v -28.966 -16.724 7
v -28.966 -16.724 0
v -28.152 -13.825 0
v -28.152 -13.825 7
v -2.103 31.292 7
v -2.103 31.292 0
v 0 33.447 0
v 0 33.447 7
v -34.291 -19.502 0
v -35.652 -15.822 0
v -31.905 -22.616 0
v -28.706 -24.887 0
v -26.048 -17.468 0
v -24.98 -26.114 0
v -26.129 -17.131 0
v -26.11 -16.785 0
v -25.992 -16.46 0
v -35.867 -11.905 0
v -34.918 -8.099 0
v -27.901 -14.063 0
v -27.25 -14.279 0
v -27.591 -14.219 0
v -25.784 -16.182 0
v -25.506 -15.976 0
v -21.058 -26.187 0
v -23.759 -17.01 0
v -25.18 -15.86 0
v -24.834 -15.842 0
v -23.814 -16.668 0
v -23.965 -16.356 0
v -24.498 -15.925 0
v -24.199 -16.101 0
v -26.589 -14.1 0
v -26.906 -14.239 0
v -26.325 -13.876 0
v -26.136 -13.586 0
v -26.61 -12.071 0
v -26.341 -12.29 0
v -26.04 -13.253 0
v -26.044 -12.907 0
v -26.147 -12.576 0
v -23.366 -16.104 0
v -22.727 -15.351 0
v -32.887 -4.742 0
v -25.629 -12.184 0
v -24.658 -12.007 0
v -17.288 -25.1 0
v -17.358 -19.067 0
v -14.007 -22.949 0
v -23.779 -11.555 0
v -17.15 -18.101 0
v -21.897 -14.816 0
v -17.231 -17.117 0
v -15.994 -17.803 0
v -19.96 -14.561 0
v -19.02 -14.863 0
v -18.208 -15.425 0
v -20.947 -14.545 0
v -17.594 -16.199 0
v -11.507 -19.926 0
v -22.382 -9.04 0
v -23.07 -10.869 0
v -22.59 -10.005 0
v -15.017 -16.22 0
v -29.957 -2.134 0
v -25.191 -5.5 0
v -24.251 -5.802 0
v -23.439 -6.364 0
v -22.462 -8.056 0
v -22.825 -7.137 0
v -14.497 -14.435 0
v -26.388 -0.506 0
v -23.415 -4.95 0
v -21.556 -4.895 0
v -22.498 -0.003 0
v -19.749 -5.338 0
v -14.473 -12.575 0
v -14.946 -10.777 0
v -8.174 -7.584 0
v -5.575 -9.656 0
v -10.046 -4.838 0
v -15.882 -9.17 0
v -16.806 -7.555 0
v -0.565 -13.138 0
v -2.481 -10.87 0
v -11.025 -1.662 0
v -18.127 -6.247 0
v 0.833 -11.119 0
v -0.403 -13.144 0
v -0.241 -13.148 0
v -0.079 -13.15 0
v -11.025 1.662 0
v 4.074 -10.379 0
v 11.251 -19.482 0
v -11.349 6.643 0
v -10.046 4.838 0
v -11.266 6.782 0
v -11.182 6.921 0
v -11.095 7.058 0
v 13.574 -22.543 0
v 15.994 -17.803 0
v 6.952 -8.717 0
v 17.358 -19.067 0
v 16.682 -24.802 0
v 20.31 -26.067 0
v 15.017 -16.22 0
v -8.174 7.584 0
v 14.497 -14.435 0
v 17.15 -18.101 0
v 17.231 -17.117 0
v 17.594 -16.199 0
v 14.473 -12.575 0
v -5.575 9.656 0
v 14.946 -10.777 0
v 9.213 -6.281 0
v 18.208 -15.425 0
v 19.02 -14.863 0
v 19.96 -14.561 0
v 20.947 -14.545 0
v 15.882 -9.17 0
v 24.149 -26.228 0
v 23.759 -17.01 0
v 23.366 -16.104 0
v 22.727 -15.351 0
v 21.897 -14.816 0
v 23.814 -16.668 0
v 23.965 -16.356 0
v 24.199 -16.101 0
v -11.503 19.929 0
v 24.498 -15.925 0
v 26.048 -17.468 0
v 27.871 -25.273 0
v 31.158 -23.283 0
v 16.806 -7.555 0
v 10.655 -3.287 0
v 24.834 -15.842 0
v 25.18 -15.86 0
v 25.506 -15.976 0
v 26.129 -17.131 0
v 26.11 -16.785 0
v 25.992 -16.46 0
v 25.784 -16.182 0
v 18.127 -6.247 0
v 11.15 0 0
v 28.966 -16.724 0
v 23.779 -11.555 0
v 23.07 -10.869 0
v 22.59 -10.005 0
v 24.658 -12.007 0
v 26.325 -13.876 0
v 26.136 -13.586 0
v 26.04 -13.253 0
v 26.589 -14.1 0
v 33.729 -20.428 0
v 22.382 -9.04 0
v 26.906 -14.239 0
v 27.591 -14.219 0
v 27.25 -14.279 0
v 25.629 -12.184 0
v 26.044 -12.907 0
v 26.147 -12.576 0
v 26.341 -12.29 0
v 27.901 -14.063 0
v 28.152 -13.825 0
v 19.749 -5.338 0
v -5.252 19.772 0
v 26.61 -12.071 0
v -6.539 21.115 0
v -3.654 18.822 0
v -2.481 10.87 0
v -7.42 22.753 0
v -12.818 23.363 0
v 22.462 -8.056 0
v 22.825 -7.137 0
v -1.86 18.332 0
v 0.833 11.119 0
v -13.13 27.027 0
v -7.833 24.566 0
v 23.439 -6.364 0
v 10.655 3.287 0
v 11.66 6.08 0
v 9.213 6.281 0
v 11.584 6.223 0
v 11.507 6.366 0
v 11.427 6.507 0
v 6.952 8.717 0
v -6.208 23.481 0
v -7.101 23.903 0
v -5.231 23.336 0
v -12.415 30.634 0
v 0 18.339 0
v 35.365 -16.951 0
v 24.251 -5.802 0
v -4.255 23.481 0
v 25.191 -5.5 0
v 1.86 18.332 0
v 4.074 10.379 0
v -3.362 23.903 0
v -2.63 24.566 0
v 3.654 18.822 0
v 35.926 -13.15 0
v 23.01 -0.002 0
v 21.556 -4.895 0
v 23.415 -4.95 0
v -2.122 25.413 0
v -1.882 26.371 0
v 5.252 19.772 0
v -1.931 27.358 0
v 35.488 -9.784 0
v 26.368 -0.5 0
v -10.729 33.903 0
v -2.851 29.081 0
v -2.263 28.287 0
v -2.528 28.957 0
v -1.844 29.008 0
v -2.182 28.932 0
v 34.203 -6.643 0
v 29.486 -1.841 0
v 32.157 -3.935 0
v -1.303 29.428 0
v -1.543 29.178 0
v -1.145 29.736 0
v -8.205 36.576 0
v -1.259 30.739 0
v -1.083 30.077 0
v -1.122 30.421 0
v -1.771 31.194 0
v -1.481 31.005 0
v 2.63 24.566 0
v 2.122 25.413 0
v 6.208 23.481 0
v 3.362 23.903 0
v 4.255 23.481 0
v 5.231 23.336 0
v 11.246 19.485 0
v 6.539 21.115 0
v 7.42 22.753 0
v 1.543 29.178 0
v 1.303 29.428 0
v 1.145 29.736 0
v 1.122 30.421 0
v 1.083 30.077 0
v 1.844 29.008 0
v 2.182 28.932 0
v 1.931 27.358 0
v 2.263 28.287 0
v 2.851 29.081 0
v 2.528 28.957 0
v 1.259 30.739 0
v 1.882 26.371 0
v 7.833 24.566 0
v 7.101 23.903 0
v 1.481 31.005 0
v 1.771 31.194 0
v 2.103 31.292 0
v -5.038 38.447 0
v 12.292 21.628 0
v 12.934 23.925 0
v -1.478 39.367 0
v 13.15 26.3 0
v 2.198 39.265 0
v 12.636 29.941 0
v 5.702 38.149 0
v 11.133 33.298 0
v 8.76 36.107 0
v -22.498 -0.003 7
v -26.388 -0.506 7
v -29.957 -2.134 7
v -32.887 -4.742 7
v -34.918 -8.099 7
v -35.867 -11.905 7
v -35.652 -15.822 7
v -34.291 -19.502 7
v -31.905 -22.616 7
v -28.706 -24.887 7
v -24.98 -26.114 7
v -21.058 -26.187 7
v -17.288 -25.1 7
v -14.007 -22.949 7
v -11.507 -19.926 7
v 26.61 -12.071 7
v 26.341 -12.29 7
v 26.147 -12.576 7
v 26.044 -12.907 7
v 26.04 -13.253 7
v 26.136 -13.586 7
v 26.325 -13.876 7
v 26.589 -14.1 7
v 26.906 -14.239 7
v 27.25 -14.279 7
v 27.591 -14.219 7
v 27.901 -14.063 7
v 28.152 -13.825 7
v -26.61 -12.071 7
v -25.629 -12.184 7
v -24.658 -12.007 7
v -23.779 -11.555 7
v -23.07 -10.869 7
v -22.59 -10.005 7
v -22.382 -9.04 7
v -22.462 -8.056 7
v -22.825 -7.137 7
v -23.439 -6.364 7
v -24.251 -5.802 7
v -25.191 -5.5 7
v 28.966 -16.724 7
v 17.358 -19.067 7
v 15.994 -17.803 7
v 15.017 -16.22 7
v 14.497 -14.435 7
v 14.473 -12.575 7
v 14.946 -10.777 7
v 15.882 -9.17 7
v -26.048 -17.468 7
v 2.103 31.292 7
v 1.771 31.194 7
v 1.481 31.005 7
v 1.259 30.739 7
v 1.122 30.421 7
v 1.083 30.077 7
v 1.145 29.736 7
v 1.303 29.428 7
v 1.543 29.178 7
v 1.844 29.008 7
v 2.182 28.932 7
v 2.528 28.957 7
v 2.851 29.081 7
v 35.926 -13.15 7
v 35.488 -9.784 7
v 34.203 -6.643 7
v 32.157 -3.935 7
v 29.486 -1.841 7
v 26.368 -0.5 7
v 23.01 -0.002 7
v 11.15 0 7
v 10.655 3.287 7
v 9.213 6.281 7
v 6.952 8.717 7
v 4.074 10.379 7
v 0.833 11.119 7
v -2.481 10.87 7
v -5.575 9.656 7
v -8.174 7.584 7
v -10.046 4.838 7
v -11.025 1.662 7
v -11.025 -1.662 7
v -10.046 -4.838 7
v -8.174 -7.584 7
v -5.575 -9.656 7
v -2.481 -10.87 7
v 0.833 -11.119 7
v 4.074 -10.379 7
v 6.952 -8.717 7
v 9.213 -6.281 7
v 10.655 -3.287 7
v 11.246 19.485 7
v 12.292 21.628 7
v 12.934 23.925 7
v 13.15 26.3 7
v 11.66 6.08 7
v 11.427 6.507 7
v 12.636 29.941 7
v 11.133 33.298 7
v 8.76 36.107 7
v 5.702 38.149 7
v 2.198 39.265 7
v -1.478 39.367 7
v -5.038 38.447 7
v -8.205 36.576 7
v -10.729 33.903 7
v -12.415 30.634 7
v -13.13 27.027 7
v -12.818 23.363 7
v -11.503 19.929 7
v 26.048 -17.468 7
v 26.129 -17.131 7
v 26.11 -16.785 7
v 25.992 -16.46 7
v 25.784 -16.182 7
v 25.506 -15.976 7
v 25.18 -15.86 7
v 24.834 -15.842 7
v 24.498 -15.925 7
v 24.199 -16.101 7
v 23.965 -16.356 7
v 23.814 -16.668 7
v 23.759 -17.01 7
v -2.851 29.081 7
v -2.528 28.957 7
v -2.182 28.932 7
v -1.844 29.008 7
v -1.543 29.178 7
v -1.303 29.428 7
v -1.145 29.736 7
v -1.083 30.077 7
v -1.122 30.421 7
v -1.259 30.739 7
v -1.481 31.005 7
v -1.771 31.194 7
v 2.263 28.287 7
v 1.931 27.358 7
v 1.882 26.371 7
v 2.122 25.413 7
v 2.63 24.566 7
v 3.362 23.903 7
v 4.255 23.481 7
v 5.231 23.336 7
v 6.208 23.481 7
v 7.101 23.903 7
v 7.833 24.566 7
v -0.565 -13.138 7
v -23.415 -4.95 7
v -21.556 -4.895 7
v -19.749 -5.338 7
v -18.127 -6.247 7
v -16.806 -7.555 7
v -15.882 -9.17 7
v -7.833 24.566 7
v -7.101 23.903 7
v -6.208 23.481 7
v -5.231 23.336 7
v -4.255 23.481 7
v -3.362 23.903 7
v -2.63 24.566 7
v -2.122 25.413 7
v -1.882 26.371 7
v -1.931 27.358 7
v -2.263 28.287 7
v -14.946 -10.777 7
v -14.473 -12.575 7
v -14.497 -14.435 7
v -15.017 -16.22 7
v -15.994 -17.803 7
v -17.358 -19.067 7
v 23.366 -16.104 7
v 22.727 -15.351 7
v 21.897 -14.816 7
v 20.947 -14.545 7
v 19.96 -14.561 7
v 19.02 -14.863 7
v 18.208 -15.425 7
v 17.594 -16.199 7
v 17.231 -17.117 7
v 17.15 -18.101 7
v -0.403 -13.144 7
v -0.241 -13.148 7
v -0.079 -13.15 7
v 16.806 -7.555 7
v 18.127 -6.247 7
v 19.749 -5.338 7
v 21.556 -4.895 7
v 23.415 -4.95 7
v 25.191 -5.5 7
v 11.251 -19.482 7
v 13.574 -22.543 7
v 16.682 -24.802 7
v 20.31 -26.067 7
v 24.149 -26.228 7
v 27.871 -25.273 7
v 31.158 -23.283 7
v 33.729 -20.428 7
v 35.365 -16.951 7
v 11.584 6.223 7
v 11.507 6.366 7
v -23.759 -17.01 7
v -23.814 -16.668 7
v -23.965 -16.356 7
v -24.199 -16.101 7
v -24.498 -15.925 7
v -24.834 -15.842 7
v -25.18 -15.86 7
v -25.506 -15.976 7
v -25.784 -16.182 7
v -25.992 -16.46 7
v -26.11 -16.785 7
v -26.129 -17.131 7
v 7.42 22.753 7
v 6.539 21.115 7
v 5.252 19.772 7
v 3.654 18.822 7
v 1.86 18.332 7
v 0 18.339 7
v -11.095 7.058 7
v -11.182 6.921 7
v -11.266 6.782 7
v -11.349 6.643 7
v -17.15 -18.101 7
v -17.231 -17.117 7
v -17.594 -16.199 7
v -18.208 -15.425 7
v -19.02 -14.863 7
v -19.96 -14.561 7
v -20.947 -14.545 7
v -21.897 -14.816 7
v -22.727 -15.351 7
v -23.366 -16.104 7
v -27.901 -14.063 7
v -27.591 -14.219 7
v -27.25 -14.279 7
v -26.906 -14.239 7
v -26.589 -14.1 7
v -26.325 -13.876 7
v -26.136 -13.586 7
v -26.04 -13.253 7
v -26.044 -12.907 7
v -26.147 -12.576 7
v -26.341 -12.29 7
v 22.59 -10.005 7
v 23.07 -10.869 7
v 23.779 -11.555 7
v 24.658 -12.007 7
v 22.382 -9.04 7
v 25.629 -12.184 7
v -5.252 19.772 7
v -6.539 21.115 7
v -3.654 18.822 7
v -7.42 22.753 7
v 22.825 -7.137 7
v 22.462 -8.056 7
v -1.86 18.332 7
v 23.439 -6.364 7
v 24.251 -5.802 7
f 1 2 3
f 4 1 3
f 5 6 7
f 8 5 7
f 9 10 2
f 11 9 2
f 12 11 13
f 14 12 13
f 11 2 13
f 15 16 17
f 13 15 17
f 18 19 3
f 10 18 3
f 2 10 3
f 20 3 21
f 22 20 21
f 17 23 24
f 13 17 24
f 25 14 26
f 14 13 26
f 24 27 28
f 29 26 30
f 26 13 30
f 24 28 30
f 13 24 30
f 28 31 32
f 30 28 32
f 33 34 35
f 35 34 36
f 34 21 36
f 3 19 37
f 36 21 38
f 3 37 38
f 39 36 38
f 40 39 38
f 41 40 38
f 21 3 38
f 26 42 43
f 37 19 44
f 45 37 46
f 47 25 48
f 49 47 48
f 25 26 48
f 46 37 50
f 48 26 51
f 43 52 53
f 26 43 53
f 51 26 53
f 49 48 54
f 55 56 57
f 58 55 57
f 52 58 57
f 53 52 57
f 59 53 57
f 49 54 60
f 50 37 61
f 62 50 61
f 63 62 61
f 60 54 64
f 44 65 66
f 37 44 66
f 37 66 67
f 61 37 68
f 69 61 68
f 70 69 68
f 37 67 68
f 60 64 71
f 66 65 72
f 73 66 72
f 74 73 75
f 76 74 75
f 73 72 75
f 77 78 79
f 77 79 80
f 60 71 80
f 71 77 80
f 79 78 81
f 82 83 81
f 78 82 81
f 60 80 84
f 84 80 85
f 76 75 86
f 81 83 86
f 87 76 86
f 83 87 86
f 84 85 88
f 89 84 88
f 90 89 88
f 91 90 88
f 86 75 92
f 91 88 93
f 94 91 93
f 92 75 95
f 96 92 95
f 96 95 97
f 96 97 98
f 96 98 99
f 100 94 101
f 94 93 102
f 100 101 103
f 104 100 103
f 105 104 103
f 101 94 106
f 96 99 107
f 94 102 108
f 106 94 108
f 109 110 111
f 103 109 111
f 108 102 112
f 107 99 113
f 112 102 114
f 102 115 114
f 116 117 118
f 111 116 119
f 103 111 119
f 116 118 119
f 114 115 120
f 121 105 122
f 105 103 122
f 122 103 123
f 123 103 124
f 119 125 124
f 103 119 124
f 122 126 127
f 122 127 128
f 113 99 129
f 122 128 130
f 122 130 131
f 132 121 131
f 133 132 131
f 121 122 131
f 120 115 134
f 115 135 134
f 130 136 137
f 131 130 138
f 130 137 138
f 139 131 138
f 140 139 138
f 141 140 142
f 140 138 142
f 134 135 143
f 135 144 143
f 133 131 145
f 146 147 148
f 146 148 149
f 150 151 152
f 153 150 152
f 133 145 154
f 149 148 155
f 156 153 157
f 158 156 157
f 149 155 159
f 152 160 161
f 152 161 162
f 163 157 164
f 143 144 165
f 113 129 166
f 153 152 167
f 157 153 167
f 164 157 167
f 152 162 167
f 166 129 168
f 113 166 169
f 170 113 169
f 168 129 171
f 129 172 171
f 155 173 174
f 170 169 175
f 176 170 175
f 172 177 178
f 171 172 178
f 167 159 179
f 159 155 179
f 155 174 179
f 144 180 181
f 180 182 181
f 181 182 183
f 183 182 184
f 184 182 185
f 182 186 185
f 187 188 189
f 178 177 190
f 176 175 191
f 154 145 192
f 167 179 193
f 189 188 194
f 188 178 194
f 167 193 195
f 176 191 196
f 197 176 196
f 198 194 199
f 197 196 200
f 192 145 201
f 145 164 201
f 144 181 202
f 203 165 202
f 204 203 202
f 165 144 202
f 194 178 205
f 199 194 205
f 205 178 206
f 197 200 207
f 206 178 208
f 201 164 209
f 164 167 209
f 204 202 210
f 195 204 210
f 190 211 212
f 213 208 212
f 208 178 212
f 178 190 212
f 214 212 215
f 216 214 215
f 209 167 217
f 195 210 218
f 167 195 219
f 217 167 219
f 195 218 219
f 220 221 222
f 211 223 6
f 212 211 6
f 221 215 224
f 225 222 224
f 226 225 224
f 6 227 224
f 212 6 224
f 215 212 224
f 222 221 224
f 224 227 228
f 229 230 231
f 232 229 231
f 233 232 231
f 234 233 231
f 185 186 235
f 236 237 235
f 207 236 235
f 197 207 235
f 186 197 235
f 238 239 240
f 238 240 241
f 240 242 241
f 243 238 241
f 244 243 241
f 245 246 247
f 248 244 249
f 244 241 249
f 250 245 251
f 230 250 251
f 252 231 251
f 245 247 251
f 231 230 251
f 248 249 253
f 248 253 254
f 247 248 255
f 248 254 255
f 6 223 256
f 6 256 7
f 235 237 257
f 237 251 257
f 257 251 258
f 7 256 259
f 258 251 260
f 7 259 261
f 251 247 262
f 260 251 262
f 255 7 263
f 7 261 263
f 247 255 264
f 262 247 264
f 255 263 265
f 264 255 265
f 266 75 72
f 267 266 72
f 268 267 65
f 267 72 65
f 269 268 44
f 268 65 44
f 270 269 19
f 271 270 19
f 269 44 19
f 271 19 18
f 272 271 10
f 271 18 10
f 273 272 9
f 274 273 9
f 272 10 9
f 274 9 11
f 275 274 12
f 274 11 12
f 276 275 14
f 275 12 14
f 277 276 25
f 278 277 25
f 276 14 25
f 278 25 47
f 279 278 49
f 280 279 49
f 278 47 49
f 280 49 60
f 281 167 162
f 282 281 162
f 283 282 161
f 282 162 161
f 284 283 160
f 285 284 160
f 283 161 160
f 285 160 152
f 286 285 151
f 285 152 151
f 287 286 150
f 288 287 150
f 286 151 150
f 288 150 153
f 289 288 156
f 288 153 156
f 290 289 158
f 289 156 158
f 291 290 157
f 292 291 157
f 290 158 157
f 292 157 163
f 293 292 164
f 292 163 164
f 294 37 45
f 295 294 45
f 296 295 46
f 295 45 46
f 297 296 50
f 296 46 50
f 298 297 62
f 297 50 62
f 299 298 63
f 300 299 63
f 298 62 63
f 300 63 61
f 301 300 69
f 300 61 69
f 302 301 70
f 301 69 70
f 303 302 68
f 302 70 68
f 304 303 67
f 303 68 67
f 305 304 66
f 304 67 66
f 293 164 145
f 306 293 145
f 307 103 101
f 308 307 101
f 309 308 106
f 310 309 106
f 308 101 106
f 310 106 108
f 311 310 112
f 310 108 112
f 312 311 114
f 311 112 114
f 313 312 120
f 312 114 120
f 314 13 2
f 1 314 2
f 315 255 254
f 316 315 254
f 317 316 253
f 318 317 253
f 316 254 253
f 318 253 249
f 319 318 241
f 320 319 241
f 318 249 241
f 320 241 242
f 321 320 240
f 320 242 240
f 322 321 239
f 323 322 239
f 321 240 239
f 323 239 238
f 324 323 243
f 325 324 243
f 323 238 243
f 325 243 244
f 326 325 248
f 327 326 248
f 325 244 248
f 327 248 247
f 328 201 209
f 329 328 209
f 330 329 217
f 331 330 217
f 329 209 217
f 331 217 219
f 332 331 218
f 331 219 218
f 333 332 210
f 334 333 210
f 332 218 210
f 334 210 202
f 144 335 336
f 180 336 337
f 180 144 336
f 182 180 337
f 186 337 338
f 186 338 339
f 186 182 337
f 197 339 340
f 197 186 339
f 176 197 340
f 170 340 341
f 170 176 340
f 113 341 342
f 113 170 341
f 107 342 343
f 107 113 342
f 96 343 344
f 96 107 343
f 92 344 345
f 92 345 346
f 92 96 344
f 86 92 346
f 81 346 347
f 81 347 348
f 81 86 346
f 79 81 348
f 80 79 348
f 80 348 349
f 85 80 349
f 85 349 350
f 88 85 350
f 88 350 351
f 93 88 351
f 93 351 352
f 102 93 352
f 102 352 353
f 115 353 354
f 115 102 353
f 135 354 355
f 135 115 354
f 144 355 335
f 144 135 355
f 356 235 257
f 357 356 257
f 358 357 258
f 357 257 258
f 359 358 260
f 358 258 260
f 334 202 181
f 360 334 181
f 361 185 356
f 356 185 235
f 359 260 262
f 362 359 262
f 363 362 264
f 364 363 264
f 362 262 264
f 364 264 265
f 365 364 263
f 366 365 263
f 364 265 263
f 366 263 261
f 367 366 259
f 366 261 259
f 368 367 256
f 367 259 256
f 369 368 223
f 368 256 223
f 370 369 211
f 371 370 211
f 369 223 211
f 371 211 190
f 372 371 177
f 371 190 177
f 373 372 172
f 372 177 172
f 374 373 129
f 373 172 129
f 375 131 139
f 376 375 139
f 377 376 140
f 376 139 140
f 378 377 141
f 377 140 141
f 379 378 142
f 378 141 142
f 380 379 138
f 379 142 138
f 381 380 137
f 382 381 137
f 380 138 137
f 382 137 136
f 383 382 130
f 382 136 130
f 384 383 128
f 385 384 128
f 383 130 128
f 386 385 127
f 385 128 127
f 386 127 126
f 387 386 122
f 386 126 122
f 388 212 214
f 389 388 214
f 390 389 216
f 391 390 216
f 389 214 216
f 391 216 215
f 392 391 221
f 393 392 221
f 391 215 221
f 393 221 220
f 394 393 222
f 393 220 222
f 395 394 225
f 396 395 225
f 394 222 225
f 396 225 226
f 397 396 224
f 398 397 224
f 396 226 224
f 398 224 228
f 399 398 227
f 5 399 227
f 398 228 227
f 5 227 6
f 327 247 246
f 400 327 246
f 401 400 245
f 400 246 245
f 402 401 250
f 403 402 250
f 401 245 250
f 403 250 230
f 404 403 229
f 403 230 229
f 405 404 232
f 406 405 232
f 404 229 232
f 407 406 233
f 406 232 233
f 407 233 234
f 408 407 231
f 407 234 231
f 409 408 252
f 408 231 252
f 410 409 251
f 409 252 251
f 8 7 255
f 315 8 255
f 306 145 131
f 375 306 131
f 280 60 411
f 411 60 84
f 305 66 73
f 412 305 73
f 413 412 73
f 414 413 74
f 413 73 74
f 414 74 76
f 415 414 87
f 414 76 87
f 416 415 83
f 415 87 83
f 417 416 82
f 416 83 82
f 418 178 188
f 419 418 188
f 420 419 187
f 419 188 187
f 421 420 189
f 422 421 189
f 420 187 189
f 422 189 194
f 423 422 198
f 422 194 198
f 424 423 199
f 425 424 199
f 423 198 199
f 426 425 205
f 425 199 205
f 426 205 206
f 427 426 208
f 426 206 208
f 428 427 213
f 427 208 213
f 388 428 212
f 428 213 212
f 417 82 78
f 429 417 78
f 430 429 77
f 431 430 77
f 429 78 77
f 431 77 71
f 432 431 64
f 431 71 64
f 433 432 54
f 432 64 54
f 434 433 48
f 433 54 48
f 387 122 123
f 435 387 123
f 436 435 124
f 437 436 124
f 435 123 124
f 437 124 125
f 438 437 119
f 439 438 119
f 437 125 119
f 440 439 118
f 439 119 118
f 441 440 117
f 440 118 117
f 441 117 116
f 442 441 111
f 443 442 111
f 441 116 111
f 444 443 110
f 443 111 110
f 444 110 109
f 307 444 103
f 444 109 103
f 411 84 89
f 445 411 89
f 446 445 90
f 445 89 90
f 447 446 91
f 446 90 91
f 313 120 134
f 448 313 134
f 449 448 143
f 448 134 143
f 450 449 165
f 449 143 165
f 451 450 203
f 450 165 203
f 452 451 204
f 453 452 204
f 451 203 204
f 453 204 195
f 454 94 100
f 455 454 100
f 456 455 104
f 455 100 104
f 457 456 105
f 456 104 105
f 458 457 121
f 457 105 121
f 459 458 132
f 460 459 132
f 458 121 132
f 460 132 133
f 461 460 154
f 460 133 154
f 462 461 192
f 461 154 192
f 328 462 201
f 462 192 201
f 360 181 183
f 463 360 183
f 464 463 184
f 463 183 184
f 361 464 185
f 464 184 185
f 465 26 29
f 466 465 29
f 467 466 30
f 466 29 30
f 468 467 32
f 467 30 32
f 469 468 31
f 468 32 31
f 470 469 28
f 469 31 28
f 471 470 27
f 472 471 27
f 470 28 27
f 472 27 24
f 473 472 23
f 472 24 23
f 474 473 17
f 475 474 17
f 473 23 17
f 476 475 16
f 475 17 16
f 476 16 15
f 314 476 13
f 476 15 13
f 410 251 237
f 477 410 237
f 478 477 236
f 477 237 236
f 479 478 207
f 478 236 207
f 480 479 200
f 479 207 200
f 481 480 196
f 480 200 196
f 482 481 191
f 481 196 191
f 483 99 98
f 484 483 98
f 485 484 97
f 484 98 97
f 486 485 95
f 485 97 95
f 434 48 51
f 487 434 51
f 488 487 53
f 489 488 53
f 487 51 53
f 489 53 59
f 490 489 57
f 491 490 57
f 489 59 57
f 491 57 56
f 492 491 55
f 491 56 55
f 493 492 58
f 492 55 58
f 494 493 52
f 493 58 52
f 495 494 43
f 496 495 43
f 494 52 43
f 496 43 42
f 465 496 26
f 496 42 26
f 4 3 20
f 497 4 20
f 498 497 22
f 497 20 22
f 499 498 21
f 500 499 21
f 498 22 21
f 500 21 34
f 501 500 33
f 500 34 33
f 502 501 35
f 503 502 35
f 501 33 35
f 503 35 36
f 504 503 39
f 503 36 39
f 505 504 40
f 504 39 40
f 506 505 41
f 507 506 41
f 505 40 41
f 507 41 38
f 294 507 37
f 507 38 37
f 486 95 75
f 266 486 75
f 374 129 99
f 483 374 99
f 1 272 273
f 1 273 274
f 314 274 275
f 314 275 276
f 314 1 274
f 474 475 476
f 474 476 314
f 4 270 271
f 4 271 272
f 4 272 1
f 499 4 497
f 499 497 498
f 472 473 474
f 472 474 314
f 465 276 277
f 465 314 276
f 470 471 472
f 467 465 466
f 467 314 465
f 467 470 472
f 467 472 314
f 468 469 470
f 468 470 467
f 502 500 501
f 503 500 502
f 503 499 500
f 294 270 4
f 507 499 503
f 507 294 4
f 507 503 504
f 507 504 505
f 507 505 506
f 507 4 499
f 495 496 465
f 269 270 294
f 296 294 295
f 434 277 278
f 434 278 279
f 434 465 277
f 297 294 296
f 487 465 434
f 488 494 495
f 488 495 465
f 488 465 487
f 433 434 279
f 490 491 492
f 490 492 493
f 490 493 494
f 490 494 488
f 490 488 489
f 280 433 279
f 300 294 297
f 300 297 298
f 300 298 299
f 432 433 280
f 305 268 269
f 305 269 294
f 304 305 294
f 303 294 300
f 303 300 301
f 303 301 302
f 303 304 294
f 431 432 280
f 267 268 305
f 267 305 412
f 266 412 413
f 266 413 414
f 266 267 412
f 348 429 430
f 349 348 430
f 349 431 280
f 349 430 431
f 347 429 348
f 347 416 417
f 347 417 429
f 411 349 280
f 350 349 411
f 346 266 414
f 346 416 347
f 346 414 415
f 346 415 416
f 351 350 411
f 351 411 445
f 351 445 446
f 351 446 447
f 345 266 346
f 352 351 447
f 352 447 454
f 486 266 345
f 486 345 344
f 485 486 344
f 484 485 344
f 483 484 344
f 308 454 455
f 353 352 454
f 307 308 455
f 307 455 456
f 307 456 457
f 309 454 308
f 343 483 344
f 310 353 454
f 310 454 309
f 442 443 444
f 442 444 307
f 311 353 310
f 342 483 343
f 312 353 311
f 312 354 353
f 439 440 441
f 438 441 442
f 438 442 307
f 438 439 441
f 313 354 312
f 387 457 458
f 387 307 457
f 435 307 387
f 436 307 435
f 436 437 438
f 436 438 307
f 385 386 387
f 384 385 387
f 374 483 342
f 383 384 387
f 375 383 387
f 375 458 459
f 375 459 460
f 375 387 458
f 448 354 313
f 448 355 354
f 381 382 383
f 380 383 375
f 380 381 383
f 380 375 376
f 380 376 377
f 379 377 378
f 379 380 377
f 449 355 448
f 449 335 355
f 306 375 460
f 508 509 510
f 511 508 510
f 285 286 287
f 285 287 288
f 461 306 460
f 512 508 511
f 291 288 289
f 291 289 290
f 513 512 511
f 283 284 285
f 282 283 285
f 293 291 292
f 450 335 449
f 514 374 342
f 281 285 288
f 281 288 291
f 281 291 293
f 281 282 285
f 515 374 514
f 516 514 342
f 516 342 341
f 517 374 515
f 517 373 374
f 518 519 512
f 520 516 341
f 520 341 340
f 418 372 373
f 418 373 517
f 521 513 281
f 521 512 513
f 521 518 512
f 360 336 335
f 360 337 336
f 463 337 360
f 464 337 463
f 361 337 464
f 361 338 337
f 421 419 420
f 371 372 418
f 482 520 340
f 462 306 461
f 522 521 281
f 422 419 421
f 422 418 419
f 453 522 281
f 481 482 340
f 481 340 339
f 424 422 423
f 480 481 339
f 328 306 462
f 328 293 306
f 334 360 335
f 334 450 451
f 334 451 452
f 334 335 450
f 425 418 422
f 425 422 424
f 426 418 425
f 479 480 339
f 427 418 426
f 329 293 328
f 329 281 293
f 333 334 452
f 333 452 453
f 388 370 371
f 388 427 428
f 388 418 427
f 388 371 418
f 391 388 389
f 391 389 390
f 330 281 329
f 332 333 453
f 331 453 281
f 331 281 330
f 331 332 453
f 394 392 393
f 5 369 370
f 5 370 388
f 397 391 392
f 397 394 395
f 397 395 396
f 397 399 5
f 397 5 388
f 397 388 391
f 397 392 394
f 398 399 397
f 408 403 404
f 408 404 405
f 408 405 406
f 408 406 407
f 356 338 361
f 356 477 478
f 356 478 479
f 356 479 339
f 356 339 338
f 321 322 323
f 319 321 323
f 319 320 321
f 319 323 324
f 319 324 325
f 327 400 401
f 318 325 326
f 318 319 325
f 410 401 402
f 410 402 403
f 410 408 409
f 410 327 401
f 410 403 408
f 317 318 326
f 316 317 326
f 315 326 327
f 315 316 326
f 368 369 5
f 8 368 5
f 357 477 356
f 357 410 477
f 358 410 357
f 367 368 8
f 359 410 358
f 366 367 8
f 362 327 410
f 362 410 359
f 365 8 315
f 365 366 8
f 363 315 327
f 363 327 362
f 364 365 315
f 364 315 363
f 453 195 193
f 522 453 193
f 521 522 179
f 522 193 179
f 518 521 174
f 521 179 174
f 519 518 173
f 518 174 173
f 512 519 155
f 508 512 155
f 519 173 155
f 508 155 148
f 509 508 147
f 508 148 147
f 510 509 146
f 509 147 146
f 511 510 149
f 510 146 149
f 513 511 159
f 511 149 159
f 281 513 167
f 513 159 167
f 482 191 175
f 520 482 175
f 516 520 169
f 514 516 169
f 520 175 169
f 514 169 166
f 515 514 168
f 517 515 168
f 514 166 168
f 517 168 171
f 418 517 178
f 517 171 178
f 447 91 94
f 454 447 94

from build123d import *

# Parameters (mm, degrees)
F0_R     = 11.15
F1_DEPTH = 7


with BuildPart() as f1:
    # F0 (on Top) → F1 (new body)
    with BuildSketch(Plane.XY):
        with BuildLine():
            ThreePointArc((-11.503365, 19.928572), (-6.67601, 14.970685), (0, 13.15))
            ThreePointArc((0, 13.15), (6.453833, 14.842664), (11.246195, 19.484899))
            ThreePointArc((11.246195, 19.484899), (12.665109, 22.761989), (13.15, 26.3))
            ThreePointArc((13.15, 26.3), (-3.290384, 39.031688), (-11.503365, 19.928572))
        make_face()
        with Locations((0, 26.3)):
            Circle(F0_R, mode=Mode.SUBTRACT)
        with Locations((0, 26.3)):
            Circle(F0_R)
        with BuildLine():
            Line((-2.10331, 31.292442), (0, 33.447244))
            Line((0, 33.447244), (2.10331, 31.292442))
            ThreePointArc((2.10331, 31.292442), (1.145089, 29.736107), (2.851212, 29.080737))
            ThreePointArc((2.851212, 29.080737), (2.971602, 24.207772), (7.832865, 24.566114))
            ThreePointArc((7.832865, 24.566114), (5.252195, 19.77236), (0, 18.339049))
            ThreePointArc((0, 18.339049), (-5.252195, 19.77236), (-7.832865, 24.566114))
            ThreePointArc((-7.832865, 24.566114), (-2.971602, 24.207772), (-2.851212, 29.080737))
            ThreePointArc((-2.851212, 29.080737), (-1.145089, 29.736107), (-2.10331, 31.292442))
        make_face(mode=Mode.SUBTRACT)
        with BuildLine():
            ThreePointArc((0, 13.15), (6.608989, 11.368543), (11.427312, 6.506846))
            Line((11.427312, 6.506846), (11.246195, 19.484899))
            ThreePointArc((11.246195, 19.484899), (6.453833, 14.842664), (0, 13.15))
        make_face()
        with BuildLine():
            ThreePointArc((-11.095406, 7.057937), (-6.328927, 11.526803), (0, 13.15))
            ThreePointArc((0, 13.15), (-6.67601, 14.970685), (-11.503365, 19.928572))
            Line((-11.503365, 19.928572), (-11.095406, 7.057937))
        make_face()
        with BuildLine():
            ThreePointArc((11.388234, -6.575), (12.701925, -3.40347), (13.15, 0))
            ThreePointArc((13.15, 0), (12.772083, 3.129918), (11.660055, 6.079935))
            ThreePointArc((11.660055, 6.079935), (11.545657, 6.294466), (11.427312, 6.506846))
            ThreePointArc((11.427312, 6.506846), (6.608989, 11.368543), (0, 13.15))
            ThreePointArc((0, 13.15), (-6.328927, 11.526803), (-11.095406, 7.057937))
            ThreePointArc((-11.095406, 7.057937), (-11.223996, 6.851599), (-11.34875, 6.64292))
            ThreePointArc((-11.34875, 6.64292), (-13.149941, 0.039281), (-11.388234, -6.575))
            ThreePointArc((-11.388234, -6.575), (-6.81804, -11.244413), (-0.564649, -13.137872))
            ThreePointArc((-0.564649, -13.137872), (-0.321661, -13.146065), (-0.078562, -13.149765))
            ThreePointArc((-0.078562, -13.149765), (6.540952, -11.407824), (11.388234, -6.575))
        make_face()
        Circle(F0_R, mode=Mode.SUBTRACT)
        with BuildLine():
            ThreePointArc((11.660055, 6.079935), (12.772083, 3.129918), (13.15, 0))
            ThreePointArc((13.15, 0), (12.701925, -3.40347), (11.388234, -6.575))
            ThreePointArc((11.388234, -6.575), (16.302998, -1.703748), (23.010332, -0.00208))
            Line((23.010332, -0.00208), (11.660055, 6.079935))
        make_face()
        with BuildLine():
            ThreePointArc((23.010332, -0.00208), (16.302998, -1.703748), (11.388234, -6.575))
            ThreePointArc((11.388234, -6.575), (9.627208, -13.010516), (11.25132, -19.48194))
            ThreePointArc((11.25132, -19.48194), (26.045016, -25.887311), (35.926468, -13.15))
            ThreePointArc((35.926468, -13.15), (32.157241, -3.9346), (23.010332, -0.00208))
        make_face()
        with Locations((22.776468, -13.15)):
            Circle(F0_R, mode=Mode.SUBTRACT)
        with BuildLine():
            ThreePointArc((11.25132, -19.48194), (9.627208, -13.010516), (11.388234, -6.575))
            ThreePointArc((11.388234, -6.575), (6.540952, -11.407824), (-0.078562, -13.149765))
            Line((-0.078562, -13.149765), (11.25132, -19.48194))
        make_face()
        with Locations((22.776468, -13.15)):
            Circle(F0_R)
        with BuildLine():
            ThreePointArc((26.048395, -17.467741), (25.17968, -15.85973), (23.759051, -17.00959))
            ThreePointArc((23.759051, -17.00959), (19.478744, -14.677369), (17.358446, -19.066517))
            ThreePointArc((17.358446, -19.066517), (14.497269, -14.434714), (15.882082, -9.169525))
            ThreePointArc((15.882082, -9.169525), (19.749464, -5.337646), (25.191311, -5.499597))
            ThreePointArc((25.191311, -5.499597), (22.450346, -9.530403), (26.610263, -12.071147))
            ThreePointArc((26.610263, -12.071147), (26.324769, -13.876377), (28.151705, -13.824701))
            Line((28.151705, -13.824701), (28.966163, -16.723622))
            Line((28.966163, -16.723622), (26.048395, -17.467741))
        make_face(mode=Mode.SUBTRACT)
        with BuildLine():
            ThreePointArc((-22.497515, -0.002959), (-16.081041, -1.832149), (-11.388234, -6.575))
            ThreePointArc((-11.388234, -6.575), (-13.149941, 0.039281), (-11.34875, 6.64292))
            Line((-11.34875, 6.64292), (-22.497515, -0.002959))
        make_face()
        with BuildLine():
            Line((-11.506967, -19.926492), (-0.564649, -13.137872))
            ThreePointArc((-0.564649, -13.137872), (-6.81804, -11.244413), (-11.388234, -6.575))
            ThreePointArc((-11.388234, -6.575), (-10.074543, -9.74653), (-9.626468, -13.15))
            ThreePointArc((-9.626468, -13.15), (-10.105311, -16.666288), (-11.506967, -19.926492))
        make_face()
        with BuildLine():
            ThreePointArc((-9.626468, -13.15), (-10.074543, -9.74653), (-11.388234, -6.575))
            ThreePointArc((-11.388234, -6.575), (-16.081041, -1.832149), (-22.497515, -0.002959))
            ThreePointArc((-22.497515, -0.002959), (-34.290742, -19.501693), (-11.506967, -19.926492))
            ThreePointArc((-11.506967, -19.926492), (-10.105311, -16.666288), (-9.626468, -13.15))
        make_face()
        with Locations((-22.776468, -13.15)):
            Circle(F0_R, mode=Mode.SUBTRACT)
        with Locations((-22.776468, -13.15)):
            Circle(F0_R)
        with BuildLine():
            ThreePointArc((-28.151705, -13.824701), (-26.324769, -13.876377), (-26.610263, -12.071147))
            ThreePointArc((-26.610263, -12.071147), (-22.450346, -9.530403), (-25.191311, -5.499597))
            ThreePointArc((-25.191311, -5.499597), (-19.749464, -5.337646), (-15.882082, -9.169525))
            ThreePointArc((-15.882082, -9.169525), (-14.497269, -14.434714), (-17.358446, -19.066517))
            ThreePointArc((-17.358446, -19.066517), (-19.478744, -14.677369), (-23.759051, -17.00959))
            ThreePointArc((-23.759051, -17.00959), (-25.17968, -15.85973), (-26.048395, -17.467741))
            Line((-26.048395, -17.467741), (-28.966163, -16.723622))
            Line((-28.966163, -16.723622), (-28.151705, -13.824701))
        make_face(mode=Mode.SUBTRACT)
    extrude(amount=F1_DEPTH)


solid = f1.part
